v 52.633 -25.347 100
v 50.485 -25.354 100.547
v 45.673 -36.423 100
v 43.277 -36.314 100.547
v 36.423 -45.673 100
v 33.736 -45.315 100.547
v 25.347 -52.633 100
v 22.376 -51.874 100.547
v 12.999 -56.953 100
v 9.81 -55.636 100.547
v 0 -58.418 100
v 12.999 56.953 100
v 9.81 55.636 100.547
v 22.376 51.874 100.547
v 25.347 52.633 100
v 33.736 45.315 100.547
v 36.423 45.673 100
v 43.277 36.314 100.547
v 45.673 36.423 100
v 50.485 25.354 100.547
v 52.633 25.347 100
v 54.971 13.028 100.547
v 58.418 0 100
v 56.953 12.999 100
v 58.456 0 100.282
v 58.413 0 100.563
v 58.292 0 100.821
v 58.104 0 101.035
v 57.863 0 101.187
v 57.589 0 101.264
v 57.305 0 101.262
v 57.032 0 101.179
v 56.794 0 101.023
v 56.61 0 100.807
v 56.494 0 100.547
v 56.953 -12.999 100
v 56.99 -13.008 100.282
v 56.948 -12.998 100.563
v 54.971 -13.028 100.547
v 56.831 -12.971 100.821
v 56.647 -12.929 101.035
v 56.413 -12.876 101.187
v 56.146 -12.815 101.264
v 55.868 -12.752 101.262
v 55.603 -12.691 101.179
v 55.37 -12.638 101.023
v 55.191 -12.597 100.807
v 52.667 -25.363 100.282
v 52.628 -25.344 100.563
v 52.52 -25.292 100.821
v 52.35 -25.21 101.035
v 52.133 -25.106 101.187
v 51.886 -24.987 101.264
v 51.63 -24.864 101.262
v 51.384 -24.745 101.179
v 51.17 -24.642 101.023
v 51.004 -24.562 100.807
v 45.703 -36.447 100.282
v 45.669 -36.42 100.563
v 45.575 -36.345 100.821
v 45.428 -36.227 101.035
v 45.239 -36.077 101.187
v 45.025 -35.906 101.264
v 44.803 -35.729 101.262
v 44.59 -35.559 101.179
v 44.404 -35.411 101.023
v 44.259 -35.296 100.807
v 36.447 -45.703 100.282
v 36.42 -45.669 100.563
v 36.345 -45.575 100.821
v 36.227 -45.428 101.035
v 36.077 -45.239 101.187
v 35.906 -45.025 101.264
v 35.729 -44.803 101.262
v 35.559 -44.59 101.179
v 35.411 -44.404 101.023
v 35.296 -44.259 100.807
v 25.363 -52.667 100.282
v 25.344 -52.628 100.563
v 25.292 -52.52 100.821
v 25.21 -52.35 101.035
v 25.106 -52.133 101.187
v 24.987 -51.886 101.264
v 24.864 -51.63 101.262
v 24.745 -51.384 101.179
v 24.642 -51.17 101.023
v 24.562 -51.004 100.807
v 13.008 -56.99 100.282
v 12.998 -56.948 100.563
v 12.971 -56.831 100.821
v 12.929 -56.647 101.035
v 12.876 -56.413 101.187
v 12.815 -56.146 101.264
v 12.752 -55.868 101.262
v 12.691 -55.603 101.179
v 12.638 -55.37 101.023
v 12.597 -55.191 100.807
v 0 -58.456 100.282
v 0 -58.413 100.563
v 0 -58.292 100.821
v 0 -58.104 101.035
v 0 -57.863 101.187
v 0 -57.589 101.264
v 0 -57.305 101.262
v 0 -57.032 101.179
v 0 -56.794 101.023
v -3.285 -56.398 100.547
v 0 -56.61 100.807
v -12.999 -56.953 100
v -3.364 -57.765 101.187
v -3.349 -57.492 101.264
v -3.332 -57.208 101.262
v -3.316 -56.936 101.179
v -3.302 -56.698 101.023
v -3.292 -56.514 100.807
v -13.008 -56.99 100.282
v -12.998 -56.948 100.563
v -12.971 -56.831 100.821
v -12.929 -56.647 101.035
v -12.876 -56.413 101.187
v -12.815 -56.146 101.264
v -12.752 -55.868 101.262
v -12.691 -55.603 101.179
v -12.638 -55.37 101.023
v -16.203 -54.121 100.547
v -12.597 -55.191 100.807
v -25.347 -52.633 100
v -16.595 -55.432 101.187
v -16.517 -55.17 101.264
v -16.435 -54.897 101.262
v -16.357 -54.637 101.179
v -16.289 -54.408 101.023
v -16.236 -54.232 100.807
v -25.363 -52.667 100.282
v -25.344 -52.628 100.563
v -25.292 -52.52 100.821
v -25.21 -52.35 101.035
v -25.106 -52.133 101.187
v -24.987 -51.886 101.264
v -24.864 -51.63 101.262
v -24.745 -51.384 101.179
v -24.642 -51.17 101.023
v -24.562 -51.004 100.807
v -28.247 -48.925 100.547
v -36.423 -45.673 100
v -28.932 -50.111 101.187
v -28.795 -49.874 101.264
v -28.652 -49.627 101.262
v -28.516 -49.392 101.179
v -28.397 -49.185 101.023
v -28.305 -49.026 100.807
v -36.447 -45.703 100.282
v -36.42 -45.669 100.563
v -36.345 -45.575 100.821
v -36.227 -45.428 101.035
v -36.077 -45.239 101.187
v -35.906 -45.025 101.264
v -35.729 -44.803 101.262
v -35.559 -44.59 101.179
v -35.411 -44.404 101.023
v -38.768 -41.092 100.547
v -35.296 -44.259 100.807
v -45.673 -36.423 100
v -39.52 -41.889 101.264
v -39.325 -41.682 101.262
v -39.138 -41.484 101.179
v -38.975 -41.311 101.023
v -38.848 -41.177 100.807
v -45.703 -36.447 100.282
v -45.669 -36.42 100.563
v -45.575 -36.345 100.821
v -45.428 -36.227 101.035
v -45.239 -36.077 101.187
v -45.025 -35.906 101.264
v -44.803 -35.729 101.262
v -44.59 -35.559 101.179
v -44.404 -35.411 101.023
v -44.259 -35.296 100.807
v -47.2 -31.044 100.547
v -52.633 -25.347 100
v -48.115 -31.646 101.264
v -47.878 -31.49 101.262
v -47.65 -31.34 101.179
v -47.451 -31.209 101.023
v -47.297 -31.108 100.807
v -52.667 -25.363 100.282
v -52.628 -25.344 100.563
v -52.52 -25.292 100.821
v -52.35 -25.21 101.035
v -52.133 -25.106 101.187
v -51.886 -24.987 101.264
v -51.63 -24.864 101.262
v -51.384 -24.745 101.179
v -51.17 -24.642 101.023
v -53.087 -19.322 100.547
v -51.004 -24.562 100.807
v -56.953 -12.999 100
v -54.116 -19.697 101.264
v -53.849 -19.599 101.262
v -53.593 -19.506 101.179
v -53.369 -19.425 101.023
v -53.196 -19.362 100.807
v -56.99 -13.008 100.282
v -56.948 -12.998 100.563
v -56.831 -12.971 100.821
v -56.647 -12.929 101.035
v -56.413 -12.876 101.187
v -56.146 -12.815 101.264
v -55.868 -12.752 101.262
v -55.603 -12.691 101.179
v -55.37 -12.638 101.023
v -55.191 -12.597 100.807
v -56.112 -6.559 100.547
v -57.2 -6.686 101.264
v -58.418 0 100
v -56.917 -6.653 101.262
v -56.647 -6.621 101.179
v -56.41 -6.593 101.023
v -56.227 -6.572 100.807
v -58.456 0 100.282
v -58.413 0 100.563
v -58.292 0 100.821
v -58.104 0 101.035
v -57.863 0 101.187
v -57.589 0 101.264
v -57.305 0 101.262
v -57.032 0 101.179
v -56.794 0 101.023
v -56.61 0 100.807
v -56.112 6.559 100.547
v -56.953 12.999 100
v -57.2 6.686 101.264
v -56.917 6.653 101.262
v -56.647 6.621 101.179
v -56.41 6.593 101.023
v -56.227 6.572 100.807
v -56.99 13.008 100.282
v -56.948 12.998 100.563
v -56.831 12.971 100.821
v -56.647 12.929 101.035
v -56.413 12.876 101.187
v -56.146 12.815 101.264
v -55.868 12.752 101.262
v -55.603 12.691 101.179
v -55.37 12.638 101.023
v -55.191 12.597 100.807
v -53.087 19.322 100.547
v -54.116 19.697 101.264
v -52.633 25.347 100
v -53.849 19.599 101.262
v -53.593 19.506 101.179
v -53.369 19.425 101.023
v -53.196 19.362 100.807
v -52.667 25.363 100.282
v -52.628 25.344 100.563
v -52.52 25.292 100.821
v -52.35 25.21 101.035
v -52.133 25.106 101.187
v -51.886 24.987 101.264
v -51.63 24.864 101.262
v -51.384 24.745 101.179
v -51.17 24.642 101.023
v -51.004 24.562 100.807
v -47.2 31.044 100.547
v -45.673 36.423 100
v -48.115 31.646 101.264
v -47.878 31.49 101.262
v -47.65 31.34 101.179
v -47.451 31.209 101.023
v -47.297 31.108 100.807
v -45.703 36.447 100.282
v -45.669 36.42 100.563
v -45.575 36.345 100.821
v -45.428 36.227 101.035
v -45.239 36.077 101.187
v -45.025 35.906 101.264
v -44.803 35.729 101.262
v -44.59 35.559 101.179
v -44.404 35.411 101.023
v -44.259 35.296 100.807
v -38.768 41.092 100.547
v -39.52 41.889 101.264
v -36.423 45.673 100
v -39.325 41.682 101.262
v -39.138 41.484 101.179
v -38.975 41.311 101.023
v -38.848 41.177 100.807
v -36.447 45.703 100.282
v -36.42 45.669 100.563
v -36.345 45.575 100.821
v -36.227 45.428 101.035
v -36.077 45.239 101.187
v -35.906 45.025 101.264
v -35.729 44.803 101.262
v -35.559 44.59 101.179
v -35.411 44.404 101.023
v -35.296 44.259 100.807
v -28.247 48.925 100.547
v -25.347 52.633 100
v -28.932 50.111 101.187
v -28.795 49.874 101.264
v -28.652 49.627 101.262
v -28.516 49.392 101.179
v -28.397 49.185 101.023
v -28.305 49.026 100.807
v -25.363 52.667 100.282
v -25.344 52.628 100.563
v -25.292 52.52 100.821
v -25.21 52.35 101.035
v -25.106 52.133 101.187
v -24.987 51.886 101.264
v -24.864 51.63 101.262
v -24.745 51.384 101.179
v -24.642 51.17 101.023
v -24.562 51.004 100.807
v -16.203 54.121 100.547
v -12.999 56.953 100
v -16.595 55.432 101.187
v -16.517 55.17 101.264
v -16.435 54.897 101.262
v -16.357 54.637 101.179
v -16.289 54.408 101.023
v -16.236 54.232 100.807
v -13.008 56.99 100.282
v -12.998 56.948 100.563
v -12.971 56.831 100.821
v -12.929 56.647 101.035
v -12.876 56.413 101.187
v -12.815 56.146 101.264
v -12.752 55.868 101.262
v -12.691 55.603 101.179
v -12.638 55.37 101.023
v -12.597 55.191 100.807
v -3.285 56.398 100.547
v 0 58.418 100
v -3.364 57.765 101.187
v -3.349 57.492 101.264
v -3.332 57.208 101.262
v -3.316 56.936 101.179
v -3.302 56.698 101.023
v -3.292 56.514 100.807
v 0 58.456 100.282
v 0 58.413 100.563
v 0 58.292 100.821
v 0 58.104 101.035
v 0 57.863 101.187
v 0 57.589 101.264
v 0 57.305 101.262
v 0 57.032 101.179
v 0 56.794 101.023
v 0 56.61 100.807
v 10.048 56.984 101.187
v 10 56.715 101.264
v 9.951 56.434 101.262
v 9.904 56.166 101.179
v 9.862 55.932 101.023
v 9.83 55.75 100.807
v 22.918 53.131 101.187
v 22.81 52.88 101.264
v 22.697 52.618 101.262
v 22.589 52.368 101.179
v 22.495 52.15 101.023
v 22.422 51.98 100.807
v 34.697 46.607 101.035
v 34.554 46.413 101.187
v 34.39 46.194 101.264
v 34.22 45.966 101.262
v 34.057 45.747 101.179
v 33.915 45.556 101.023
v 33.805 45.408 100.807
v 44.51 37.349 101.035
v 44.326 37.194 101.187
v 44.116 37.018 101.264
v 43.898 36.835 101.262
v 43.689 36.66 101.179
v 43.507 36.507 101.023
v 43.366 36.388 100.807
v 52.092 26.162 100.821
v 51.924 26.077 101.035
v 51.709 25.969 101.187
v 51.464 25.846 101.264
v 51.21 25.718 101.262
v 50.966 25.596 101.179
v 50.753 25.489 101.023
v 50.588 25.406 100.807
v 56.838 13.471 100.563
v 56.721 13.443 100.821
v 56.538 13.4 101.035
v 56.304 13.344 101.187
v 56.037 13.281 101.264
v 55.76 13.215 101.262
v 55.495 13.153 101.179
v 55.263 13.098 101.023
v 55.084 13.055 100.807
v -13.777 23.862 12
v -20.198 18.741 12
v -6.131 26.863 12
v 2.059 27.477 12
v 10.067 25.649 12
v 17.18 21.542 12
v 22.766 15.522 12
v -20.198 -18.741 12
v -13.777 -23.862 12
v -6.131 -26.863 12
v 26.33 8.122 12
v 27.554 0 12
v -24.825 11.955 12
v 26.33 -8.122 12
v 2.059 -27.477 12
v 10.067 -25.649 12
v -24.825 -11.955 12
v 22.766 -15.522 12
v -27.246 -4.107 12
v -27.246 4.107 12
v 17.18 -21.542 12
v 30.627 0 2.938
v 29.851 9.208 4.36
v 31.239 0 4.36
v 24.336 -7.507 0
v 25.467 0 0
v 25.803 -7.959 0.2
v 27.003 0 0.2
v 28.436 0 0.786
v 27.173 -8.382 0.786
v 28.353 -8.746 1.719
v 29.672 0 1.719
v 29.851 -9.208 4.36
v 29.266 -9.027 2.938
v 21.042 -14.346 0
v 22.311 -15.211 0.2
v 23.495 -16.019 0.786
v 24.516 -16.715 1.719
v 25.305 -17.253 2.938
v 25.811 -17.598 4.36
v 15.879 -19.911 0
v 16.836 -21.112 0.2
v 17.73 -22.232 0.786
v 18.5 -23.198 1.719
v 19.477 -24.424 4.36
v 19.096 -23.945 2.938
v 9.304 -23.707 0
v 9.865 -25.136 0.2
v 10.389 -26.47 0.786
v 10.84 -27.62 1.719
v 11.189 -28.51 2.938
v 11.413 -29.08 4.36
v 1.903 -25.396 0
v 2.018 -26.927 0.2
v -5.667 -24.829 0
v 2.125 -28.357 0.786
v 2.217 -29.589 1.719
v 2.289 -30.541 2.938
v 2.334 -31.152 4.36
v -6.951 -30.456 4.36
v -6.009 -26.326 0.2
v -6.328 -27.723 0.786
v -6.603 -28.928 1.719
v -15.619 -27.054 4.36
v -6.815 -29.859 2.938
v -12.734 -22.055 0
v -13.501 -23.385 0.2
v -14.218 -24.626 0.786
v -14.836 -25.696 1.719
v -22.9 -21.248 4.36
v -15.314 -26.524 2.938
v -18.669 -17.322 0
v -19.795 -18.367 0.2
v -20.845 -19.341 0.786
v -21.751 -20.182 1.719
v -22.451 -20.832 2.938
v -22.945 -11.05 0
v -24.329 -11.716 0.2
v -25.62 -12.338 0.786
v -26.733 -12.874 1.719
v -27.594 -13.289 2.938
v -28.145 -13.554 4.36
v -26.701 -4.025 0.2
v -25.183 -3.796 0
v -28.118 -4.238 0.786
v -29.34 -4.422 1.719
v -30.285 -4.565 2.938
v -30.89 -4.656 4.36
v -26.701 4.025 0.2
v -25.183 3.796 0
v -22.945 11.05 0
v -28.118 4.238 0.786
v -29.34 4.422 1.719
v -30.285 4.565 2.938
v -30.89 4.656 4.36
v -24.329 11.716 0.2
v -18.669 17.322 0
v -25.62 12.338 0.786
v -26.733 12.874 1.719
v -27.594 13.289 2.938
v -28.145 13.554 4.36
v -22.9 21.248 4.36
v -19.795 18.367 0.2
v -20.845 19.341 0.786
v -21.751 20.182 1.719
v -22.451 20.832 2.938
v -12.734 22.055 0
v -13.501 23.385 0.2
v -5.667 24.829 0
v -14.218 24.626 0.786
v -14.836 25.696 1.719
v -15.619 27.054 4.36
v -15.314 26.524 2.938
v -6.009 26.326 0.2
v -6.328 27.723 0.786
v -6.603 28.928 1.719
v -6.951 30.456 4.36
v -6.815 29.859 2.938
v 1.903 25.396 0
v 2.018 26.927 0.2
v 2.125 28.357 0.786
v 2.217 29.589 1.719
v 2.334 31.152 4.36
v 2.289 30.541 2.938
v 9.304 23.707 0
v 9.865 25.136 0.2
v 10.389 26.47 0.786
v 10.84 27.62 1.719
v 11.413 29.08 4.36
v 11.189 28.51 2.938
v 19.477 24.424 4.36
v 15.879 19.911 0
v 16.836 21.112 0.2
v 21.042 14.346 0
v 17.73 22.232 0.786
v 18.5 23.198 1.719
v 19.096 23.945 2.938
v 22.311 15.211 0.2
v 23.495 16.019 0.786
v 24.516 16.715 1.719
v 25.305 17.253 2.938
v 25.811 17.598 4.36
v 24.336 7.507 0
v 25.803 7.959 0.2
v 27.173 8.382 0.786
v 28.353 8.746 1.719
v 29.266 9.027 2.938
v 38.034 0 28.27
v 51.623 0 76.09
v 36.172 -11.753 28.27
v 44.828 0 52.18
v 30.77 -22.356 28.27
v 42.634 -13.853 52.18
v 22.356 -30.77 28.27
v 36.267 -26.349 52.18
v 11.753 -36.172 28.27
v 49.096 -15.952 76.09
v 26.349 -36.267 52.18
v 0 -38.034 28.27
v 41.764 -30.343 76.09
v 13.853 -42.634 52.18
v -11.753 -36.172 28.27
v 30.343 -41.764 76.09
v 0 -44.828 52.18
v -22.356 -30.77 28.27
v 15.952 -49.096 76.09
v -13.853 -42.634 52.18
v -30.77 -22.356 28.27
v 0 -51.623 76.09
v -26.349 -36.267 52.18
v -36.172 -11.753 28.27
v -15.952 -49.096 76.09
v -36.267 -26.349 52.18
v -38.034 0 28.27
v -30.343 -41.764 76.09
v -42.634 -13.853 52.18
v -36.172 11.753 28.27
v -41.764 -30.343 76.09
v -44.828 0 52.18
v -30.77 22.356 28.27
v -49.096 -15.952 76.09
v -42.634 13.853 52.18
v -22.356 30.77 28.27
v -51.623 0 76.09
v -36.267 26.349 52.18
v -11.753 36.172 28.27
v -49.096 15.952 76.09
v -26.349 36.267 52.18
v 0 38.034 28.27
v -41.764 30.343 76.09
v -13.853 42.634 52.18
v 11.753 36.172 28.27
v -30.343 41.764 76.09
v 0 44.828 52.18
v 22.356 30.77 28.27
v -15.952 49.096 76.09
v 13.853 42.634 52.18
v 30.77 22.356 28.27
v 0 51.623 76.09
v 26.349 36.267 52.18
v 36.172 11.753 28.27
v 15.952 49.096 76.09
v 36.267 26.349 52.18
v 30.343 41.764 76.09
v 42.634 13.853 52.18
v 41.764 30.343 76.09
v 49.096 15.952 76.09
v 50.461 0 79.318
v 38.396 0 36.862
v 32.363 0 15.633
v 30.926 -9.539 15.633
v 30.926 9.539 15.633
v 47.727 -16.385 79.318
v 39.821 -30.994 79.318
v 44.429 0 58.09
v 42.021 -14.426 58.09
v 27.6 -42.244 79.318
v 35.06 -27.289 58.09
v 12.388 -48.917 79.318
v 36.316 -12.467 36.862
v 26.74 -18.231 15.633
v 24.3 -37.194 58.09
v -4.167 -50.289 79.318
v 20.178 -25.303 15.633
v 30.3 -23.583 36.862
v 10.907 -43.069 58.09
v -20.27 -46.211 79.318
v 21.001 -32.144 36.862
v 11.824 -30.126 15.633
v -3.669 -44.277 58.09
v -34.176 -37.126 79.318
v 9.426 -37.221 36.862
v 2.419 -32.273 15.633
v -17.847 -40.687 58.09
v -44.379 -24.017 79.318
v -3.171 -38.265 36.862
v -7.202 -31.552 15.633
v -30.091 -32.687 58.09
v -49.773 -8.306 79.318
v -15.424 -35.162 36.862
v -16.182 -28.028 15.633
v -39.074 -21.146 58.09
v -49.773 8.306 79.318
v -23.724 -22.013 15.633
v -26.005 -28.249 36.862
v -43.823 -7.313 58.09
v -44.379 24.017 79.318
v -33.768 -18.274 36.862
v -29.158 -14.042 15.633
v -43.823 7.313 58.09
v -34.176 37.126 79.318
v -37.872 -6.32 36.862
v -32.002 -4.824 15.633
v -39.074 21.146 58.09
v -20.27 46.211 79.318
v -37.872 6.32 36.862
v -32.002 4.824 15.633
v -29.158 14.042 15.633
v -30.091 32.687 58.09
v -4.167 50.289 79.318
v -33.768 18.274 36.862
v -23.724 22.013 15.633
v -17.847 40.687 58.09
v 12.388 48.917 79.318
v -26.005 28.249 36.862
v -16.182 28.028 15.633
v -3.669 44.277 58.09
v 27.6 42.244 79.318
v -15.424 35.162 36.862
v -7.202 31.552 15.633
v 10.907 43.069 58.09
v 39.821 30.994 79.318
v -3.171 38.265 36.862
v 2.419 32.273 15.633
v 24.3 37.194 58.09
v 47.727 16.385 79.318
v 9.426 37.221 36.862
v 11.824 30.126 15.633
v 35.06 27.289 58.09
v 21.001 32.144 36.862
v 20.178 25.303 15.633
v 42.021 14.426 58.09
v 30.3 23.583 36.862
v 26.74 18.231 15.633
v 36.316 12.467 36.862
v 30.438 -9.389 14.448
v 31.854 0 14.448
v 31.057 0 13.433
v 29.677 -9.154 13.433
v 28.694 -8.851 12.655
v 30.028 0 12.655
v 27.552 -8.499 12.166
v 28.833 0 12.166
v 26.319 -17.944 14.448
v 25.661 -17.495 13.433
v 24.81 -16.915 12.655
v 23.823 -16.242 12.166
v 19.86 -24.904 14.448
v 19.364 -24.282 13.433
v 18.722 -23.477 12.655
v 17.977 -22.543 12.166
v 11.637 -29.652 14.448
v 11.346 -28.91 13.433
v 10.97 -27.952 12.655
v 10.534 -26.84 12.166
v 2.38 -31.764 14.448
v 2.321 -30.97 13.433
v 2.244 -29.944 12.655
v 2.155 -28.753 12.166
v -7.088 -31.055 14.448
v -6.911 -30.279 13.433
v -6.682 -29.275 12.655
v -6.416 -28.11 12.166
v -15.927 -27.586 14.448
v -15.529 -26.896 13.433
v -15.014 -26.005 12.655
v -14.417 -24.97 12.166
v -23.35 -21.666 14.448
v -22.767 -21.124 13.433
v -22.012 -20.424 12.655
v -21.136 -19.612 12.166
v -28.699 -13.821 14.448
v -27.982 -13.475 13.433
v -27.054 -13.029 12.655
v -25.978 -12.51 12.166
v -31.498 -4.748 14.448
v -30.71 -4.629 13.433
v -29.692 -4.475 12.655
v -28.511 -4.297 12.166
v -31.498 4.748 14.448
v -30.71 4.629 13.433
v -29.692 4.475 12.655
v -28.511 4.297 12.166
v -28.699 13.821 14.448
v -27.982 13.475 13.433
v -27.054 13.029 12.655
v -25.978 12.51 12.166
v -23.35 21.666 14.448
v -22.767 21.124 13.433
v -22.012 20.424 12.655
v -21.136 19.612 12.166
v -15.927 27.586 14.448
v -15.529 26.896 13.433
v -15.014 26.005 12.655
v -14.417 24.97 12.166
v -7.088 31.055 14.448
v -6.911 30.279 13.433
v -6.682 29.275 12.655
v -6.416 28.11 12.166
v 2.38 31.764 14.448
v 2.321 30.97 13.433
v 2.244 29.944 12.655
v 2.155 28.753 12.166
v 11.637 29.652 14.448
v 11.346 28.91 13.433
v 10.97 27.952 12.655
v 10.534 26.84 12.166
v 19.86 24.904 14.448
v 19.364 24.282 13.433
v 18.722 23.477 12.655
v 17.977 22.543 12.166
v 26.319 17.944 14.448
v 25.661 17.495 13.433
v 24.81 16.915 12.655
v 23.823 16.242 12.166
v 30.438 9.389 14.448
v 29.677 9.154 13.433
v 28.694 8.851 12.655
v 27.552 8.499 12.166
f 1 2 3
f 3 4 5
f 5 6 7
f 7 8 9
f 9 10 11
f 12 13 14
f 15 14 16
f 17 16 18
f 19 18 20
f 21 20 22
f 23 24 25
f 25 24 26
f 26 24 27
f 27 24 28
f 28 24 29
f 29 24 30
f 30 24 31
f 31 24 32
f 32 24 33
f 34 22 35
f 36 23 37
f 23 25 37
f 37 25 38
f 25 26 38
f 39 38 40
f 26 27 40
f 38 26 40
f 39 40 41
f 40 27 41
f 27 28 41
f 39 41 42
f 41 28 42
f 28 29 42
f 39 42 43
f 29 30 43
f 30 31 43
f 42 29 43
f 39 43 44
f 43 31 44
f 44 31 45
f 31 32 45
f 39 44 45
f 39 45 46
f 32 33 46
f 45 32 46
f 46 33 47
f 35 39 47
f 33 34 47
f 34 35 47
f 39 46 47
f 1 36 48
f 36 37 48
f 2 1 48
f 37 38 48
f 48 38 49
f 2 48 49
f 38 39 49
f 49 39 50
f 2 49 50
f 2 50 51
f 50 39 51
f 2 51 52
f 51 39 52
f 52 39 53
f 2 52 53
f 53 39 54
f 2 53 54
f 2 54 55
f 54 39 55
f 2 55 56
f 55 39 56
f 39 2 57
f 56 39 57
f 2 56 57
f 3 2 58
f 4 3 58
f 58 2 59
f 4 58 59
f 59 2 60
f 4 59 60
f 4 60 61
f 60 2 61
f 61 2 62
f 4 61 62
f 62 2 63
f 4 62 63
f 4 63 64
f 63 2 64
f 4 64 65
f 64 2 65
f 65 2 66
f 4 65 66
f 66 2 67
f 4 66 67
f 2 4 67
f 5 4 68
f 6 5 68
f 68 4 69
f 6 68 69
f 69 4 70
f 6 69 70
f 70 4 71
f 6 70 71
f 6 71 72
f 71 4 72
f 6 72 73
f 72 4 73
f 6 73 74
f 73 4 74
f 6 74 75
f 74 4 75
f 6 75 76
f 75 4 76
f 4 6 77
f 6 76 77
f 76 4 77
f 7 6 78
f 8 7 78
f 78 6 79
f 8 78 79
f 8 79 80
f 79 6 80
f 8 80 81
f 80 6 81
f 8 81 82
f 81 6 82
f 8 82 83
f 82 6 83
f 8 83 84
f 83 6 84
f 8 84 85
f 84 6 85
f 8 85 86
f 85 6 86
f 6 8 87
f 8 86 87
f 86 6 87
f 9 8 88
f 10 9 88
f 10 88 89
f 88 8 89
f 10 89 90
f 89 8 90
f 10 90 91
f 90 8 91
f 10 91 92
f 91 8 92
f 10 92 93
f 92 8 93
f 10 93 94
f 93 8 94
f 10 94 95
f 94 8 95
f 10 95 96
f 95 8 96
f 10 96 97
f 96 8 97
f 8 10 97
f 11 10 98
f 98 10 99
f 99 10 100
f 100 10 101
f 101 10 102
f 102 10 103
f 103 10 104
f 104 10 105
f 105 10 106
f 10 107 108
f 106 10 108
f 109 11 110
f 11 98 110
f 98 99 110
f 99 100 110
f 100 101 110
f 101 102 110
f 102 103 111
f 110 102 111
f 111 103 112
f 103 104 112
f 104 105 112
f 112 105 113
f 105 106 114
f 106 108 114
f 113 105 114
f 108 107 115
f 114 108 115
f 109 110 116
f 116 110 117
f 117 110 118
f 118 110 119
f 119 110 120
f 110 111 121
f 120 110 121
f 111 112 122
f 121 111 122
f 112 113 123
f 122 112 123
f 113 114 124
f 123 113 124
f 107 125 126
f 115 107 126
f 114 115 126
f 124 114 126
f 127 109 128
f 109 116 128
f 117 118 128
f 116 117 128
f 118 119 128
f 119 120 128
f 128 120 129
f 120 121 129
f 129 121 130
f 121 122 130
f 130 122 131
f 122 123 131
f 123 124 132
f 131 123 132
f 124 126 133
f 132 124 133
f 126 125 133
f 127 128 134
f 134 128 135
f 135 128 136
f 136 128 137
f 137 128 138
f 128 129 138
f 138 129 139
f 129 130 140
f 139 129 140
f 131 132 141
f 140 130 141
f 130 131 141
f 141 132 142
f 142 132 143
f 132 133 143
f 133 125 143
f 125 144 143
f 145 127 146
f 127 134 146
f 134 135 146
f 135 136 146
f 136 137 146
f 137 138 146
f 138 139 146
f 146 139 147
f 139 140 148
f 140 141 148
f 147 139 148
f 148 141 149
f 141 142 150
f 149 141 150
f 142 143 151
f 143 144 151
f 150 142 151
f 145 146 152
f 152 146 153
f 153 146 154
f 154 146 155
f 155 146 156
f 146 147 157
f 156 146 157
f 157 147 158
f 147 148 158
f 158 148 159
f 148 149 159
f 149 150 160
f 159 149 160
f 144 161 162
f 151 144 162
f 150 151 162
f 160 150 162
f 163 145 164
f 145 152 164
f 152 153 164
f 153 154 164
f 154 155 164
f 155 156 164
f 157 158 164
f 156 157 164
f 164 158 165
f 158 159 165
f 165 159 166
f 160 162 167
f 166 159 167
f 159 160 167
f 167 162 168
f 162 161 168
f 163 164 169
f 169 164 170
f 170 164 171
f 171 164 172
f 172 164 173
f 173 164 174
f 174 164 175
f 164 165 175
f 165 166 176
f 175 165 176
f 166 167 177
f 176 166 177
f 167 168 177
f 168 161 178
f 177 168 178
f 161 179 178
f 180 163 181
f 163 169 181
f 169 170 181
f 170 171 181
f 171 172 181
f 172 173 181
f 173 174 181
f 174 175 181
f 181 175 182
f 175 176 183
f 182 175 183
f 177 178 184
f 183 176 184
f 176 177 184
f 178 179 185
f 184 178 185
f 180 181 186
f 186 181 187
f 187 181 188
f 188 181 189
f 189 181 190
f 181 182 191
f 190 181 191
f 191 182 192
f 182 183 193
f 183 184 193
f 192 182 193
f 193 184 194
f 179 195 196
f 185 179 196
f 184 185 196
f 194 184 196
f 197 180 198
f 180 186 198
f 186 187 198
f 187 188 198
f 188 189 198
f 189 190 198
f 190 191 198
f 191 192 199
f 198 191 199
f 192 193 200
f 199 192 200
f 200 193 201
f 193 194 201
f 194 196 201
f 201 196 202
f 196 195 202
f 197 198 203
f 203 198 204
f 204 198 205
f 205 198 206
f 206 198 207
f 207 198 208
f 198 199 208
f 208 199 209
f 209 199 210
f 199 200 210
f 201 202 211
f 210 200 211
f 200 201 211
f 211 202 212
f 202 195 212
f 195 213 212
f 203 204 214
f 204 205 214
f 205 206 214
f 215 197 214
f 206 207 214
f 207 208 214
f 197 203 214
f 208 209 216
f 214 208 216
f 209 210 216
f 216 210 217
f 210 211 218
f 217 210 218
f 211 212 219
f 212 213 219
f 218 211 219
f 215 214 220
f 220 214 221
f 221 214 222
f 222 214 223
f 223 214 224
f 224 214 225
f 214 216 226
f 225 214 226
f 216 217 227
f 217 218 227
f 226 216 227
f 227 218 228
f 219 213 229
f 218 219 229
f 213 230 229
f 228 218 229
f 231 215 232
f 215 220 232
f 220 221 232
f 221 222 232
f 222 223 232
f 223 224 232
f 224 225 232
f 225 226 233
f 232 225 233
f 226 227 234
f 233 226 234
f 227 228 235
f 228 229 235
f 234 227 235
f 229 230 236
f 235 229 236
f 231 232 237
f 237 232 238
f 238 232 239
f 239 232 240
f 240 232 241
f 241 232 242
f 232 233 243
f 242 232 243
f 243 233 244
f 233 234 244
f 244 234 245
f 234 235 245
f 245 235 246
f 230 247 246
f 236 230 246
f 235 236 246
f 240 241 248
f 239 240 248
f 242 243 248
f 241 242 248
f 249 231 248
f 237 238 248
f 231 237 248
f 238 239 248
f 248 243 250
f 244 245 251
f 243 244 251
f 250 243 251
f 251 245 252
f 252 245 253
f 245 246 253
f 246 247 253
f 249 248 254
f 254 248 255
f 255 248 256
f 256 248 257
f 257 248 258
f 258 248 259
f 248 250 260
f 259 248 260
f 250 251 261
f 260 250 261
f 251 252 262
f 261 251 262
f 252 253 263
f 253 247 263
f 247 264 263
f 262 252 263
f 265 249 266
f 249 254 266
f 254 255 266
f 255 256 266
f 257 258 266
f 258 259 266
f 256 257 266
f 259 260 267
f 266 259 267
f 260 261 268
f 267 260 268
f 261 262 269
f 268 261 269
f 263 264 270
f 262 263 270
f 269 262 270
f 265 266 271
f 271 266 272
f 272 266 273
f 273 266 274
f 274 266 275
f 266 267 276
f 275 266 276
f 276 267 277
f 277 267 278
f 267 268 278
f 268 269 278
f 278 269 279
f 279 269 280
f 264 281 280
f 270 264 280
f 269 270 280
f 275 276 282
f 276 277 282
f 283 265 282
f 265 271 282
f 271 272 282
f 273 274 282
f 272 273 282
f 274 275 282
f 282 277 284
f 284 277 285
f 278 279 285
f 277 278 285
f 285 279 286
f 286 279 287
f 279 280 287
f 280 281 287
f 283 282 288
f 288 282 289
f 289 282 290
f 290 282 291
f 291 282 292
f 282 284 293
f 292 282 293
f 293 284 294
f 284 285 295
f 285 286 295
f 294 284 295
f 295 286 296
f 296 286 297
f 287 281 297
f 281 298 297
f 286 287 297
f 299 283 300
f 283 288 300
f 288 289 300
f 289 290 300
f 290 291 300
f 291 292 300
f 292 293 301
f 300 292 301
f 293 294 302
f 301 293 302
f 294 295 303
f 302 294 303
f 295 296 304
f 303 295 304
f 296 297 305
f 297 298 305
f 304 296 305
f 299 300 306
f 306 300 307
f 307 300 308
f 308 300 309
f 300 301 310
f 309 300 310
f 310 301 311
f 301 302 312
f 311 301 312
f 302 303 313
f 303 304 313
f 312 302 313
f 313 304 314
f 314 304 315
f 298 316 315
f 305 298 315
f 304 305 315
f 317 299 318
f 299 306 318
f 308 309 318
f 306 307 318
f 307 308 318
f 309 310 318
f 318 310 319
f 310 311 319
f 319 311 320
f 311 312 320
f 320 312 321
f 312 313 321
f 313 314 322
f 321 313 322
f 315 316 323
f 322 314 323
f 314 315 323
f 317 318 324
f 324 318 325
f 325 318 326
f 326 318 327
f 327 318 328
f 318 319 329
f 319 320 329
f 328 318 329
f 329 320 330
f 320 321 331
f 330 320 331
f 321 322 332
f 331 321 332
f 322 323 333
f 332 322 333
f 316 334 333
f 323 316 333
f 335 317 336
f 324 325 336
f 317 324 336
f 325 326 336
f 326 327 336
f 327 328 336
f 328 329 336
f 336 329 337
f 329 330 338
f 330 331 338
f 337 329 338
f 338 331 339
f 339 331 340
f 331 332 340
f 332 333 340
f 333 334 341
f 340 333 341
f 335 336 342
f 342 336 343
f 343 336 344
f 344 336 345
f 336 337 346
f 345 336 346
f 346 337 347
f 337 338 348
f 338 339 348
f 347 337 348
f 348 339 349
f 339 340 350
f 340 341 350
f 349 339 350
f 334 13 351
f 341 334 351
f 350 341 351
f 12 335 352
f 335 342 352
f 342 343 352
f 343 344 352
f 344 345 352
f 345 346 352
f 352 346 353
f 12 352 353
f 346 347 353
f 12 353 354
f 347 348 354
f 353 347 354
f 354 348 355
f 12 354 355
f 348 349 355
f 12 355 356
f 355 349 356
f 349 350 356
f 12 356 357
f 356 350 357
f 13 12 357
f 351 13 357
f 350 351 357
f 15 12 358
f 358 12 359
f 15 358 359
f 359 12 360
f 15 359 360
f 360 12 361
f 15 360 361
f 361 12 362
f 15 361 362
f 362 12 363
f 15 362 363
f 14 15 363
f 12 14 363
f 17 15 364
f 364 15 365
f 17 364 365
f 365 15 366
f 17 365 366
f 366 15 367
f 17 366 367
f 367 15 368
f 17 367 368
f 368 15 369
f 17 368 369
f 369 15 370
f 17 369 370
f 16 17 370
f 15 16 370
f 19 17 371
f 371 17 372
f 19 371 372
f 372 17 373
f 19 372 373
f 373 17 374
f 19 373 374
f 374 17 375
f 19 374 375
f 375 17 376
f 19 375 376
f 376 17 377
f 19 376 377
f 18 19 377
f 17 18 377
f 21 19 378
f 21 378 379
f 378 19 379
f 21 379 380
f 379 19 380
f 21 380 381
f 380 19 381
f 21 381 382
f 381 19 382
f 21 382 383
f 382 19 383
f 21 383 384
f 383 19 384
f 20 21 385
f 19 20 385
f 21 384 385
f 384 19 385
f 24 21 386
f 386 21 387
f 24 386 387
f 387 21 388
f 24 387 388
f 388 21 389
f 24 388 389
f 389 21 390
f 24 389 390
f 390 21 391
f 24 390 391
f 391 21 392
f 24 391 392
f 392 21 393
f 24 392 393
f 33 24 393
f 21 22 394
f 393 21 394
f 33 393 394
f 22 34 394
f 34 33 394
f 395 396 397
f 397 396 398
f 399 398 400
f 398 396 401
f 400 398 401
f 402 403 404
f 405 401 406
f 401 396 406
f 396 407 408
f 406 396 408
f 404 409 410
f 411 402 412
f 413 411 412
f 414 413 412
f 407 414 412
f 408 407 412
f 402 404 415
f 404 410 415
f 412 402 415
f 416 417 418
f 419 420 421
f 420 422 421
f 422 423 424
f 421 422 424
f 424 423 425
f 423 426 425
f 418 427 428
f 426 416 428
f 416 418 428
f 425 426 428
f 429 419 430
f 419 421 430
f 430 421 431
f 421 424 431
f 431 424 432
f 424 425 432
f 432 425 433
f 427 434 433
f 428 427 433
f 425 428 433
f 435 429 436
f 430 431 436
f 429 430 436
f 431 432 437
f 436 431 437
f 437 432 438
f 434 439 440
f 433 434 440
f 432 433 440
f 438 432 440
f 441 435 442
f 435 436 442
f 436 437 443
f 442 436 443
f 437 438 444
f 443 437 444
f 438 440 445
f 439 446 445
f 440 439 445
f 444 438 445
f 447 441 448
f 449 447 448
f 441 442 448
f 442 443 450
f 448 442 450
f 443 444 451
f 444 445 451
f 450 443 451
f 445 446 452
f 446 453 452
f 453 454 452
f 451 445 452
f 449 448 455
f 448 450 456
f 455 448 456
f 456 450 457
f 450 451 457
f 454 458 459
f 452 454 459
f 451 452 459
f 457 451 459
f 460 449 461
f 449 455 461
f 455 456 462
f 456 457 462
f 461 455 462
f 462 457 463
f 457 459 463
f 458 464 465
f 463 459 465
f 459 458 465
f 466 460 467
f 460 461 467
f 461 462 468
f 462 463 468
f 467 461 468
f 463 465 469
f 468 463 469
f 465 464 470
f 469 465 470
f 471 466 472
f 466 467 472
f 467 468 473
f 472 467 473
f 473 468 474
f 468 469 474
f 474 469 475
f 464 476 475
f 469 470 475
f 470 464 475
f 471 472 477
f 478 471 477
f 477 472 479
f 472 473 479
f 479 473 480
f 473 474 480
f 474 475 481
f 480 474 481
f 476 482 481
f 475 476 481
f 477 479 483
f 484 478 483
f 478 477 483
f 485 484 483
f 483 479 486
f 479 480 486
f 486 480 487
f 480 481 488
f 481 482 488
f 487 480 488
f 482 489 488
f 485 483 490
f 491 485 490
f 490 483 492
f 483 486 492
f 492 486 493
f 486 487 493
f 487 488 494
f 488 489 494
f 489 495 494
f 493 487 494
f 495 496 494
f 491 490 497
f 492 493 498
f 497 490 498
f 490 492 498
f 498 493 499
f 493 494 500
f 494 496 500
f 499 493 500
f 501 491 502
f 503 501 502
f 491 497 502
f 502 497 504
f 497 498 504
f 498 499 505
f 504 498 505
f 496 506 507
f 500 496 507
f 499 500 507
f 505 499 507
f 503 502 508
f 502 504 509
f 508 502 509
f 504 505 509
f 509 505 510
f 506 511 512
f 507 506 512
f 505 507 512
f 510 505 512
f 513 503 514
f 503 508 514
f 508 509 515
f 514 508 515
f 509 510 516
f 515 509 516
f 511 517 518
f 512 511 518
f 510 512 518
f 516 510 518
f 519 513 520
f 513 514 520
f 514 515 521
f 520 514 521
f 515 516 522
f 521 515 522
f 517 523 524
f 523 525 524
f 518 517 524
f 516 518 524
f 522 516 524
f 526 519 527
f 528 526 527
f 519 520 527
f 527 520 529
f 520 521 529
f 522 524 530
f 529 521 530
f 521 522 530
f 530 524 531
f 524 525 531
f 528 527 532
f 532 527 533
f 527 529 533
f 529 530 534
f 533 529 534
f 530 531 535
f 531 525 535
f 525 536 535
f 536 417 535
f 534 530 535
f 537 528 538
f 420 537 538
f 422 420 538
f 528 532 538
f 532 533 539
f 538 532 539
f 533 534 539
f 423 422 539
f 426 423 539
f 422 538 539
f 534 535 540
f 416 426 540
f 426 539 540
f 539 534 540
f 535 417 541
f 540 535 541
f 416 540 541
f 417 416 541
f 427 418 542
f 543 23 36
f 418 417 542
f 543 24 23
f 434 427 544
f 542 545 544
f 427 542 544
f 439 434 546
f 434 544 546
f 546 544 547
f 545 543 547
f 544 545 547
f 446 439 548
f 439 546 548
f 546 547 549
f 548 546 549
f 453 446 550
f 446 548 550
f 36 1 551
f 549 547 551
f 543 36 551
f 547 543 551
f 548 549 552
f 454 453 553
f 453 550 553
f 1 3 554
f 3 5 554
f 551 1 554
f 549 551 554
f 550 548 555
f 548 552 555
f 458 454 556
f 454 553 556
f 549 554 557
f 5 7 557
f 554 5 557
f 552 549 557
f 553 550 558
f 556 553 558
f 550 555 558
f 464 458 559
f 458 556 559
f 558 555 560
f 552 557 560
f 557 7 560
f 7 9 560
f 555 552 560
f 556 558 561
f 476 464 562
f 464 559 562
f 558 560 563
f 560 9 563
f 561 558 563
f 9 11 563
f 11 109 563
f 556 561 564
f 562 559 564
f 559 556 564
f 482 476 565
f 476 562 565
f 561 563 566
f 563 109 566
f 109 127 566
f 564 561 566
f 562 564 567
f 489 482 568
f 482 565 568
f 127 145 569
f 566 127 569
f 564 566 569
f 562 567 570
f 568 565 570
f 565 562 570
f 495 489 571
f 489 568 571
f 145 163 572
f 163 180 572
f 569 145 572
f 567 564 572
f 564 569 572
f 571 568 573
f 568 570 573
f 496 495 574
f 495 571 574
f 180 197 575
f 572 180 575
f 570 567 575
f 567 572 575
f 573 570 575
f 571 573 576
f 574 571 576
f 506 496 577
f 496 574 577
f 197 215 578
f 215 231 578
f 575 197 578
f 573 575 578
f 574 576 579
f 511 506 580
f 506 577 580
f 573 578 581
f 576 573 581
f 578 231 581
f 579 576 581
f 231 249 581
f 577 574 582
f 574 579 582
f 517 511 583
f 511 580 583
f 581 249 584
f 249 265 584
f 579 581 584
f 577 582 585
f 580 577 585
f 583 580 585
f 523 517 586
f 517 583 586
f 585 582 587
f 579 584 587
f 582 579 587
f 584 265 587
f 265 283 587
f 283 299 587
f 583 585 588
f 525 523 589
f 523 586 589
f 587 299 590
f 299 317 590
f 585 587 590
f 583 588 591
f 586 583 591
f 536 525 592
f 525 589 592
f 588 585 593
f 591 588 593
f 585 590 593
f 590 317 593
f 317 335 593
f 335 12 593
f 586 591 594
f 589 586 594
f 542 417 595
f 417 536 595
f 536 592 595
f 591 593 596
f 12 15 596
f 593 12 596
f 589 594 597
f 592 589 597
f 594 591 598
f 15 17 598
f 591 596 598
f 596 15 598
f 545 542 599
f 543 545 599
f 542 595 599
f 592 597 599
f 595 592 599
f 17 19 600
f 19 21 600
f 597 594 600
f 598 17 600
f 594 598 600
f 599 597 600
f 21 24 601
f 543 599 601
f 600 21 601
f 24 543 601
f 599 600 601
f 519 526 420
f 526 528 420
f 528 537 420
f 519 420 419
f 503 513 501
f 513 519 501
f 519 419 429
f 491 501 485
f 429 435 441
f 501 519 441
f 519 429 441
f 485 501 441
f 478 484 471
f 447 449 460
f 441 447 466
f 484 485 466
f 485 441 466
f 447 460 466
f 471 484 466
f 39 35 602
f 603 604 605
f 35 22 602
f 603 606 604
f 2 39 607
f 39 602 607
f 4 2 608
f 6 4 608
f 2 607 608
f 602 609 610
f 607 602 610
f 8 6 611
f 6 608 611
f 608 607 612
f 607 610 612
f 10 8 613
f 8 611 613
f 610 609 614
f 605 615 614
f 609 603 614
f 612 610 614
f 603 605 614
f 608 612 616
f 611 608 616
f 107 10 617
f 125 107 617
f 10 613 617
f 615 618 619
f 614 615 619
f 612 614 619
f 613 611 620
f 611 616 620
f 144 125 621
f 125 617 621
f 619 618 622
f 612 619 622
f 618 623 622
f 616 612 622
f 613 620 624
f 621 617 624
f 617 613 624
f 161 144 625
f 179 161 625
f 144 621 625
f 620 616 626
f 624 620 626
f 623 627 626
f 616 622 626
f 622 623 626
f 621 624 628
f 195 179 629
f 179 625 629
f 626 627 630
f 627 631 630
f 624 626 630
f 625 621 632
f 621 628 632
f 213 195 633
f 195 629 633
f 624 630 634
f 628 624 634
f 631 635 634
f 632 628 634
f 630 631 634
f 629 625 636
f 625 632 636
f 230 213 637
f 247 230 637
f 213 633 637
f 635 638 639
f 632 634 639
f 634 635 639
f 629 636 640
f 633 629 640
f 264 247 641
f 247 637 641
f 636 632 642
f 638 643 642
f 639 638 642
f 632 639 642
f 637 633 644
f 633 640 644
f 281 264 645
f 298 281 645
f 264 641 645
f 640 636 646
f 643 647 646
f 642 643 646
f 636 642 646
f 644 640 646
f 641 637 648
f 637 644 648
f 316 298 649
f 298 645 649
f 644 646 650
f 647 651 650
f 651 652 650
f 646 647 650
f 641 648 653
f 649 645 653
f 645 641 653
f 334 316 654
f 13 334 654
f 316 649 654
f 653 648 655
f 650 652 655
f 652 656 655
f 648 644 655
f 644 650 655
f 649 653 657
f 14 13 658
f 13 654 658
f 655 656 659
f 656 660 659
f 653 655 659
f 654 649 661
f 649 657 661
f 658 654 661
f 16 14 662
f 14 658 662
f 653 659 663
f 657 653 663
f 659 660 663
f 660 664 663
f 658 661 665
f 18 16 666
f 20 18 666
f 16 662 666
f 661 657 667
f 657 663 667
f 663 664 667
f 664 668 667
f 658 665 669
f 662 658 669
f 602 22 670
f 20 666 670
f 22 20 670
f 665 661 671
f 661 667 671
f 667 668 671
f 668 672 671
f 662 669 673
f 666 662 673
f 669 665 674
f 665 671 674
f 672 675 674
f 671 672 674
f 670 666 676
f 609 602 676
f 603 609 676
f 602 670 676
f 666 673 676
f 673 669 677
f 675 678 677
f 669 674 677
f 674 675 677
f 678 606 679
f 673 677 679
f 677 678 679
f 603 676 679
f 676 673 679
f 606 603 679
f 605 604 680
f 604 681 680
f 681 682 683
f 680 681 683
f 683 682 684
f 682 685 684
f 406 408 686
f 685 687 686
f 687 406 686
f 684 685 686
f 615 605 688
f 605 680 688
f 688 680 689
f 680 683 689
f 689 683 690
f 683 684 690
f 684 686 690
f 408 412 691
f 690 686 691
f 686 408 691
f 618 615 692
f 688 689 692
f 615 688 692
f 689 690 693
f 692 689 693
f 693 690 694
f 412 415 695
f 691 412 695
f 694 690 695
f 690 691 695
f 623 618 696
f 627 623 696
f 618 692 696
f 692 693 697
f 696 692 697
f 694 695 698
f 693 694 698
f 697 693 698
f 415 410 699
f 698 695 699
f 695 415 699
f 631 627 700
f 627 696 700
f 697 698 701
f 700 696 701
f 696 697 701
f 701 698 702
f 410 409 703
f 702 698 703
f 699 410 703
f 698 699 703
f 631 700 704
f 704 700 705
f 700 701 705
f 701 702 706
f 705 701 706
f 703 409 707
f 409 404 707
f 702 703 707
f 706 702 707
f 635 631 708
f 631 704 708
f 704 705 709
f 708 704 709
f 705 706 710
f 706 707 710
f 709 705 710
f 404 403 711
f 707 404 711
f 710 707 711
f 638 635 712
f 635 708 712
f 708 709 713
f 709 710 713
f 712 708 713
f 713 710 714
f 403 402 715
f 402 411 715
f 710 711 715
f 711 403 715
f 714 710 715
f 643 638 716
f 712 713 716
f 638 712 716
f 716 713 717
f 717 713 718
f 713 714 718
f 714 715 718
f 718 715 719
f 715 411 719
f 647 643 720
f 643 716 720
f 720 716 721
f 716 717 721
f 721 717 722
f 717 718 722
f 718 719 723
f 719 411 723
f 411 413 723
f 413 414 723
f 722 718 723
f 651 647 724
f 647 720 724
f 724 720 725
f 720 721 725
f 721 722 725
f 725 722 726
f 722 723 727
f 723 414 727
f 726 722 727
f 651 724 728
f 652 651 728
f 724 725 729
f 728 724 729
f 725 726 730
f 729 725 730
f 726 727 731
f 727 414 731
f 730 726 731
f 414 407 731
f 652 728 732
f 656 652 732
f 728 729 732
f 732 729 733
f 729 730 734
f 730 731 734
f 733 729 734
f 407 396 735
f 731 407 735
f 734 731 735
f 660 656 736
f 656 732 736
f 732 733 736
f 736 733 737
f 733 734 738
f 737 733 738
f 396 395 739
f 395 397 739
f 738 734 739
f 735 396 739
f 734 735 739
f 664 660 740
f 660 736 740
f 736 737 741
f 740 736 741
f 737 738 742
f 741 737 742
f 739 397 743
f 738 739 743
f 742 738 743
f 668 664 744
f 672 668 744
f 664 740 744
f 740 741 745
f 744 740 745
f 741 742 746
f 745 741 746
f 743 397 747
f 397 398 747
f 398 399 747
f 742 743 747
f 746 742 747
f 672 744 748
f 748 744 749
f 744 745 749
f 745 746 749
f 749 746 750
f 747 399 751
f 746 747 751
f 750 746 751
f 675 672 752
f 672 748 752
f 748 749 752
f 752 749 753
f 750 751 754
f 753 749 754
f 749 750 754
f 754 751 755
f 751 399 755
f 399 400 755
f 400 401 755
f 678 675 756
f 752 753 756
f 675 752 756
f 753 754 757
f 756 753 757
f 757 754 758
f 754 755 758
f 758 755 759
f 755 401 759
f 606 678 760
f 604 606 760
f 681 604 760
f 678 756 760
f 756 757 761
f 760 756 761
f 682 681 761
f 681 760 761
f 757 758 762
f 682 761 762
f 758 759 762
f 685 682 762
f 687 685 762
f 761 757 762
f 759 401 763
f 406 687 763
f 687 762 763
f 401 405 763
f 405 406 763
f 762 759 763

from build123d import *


with BuildPart() as f1:
    # F0 (on Front) → F1 (revolve)
    with BuildSketch(Plane.XZ):
        with BuildLine():
            Line((0, 12), (0, 0))
            Line((0, 0), (25.467497, 0))
            ThreePointArc((25.467497, 0), (29.084074, 1.212477), (31.238978, 4.359876))
            Line((31.238978, 4.359876), (58.417735, 100))
            ThreePointArc((58.417735, 100), (57.729175, 101.235268), (56.493908, 100.546708))
            Line((56.493908, 100.546708), (32.363421, 15.63323))
            ThreePointArc((32.363421, 15.63323), (30.567667, 13.010398), (27.553853, 12))
            Line((27.553853, 12), (0, 12))
        make_face()
    revolve(axis=Axis((0, 0, 6), (0, 0, -1)))


solid = f1.part
